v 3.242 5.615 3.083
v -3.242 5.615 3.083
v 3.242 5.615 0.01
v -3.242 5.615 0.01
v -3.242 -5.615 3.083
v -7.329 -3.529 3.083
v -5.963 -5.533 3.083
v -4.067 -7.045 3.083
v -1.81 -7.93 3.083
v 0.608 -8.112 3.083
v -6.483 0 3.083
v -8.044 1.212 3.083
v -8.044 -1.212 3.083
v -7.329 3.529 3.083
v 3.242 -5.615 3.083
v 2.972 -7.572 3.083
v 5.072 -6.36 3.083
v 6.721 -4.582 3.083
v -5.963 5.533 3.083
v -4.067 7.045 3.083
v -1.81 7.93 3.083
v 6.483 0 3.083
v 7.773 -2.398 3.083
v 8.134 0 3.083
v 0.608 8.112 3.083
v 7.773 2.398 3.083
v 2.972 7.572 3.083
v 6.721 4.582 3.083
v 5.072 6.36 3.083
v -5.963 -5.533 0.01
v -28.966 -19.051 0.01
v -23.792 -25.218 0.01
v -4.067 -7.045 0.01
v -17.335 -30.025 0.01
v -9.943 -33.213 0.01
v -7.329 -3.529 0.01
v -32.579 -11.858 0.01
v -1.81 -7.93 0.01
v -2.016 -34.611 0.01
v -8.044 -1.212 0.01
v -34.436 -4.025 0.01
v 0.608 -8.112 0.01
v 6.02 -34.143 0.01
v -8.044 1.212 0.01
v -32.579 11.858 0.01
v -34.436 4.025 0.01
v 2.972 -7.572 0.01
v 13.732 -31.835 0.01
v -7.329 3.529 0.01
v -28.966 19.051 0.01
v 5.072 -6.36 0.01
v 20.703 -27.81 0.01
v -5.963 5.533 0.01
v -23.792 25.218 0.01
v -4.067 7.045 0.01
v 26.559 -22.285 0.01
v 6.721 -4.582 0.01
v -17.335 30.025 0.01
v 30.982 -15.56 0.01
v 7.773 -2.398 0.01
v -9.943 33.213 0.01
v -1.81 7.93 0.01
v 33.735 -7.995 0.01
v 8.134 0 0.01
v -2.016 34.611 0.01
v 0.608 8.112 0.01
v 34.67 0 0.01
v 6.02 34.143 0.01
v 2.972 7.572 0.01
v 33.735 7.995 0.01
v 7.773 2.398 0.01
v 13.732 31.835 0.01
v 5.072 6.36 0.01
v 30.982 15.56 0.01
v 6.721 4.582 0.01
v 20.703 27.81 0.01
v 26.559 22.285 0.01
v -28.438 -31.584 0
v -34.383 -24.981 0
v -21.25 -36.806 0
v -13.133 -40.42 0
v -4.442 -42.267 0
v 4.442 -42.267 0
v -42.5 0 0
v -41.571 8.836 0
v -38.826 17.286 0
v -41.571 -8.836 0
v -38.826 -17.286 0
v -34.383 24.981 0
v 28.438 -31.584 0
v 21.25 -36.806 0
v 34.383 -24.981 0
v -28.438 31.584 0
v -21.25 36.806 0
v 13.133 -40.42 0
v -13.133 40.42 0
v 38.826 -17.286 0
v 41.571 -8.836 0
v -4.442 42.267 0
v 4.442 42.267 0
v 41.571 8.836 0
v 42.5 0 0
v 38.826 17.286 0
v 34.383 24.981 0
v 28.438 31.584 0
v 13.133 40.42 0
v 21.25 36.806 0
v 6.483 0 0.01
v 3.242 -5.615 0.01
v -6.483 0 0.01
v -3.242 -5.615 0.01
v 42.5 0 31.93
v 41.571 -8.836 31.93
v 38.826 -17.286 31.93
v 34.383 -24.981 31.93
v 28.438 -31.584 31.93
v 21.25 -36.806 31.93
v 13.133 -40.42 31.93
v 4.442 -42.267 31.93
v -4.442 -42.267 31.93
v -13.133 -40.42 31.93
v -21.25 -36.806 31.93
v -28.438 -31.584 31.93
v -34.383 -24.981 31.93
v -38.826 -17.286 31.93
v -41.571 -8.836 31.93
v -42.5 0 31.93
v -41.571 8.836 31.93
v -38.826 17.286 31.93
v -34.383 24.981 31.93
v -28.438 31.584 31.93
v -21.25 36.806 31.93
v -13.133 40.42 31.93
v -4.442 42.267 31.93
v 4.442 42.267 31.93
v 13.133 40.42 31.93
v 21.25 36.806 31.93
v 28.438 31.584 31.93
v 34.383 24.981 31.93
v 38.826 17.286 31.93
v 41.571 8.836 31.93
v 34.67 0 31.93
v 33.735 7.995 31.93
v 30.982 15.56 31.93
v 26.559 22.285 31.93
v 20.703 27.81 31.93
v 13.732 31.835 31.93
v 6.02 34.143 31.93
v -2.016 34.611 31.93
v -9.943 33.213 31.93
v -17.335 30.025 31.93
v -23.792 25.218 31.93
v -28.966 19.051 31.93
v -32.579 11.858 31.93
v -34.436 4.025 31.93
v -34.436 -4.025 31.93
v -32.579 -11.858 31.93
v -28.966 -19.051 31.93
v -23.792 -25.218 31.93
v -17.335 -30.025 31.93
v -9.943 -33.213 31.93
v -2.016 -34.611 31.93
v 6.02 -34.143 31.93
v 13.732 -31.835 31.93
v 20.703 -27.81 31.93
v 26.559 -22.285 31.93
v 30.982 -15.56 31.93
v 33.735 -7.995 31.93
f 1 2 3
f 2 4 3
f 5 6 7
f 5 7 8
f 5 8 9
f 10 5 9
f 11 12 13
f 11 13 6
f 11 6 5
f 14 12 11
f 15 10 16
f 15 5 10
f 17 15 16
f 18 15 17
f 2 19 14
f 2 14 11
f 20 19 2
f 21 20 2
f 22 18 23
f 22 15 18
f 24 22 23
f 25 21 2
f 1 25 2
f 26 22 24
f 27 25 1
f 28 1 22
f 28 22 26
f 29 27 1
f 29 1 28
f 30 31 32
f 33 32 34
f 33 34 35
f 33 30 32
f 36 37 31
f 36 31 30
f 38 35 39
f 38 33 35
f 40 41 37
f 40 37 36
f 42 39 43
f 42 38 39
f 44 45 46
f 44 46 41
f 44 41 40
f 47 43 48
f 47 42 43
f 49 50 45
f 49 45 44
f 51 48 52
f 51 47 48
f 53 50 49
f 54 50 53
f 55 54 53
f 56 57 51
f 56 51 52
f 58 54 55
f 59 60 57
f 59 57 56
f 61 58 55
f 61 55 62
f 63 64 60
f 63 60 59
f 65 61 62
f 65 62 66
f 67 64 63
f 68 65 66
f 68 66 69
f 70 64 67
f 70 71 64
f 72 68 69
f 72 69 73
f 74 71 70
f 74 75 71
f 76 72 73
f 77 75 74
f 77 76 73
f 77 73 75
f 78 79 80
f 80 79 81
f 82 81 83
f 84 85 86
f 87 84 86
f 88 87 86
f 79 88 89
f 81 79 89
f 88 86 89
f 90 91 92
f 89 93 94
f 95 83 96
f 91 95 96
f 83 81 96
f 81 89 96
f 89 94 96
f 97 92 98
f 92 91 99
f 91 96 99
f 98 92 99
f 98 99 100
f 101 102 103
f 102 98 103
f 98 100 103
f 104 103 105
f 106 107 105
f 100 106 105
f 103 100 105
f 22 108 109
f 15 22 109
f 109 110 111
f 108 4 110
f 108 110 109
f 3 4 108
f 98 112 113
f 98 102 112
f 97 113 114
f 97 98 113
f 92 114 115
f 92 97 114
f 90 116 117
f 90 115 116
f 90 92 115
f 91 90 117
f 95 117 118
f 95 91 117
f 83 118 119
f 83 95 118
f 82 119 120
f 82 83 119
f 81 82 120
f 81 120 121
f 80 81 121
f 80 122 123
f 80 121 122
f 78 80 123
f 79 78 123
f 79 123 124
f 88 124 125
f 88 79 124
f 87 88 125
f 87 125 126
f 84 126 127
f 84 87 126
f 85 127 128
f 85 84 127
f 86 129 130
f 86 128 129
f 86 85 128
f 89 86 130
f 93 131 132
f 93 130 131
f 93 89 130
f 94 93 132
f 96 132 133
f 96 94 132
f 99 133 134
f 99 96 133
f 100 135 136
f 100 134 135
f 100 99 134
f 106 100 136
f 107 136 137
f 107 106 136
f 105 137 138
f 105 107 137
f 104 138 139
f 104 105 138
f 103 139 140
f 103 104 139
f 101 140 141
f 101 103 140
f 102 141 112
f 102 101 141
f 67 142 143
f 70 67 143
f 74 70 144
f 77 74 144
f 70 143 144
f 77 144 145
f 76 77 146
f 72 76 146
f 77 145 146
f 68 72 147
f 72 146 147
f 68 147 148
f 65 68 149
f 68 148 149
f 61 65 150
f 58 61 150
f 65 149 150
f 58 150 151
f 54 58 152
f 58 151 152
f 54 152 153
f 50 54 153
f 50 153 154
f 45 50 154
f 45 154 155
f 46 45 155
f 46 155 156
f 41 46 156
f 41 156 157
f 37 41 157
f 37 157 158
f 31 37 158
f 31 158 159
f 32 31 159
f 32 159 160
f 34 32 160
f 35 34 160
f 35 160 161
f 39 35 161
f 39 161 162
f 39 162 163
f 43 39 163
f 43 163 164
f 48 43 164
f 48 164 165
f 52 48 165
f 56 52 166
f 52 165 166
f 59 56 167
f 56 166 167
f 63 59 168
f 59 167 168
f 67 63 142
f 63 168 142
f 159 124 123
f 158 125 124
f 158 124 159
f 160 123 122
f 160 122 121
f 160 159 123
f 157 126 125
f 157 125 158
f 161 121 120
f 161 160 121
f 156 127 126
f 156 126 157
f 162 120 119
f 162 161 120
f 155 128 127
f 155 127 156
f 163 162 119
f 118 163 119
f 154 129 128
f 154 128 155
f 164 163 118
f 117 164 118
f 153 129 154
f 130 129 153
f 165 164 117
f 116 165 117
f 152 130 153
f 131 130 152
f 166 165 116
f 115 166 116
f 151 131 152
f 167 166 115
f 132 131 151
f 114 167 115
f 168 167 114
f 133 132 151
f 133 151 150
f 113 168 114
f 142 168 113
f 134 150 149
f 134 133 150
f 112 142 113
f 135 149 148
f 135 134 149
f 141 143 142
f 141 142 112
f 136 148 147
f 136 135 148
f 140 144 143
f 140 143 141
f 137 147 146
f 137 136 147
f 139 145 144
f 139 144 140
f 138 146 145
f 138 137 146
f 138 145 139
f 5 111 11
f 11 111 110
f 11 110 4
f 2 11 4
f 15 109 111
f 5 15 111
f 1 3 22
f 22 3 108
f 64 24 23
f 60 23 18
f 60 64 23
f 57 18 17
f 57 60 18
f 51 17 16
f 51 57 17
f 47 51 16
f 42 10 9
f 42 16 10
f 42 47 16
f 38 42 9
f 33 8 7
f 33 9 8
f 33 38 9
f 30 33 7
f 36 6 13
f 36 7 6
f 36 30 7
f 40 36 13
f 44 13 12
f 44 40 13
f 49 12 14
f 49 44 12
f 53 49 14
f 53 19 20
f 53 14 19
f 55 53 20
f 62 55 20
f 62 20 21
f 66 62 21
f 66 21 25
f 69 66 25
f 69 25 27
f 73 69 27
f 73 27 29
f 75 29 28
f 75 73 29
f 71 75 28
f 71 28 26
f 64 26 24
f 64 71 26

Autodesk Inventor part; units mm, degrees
ref_plane "YZ Plane" through (0, 0, 0) normal (1, 0, 0) x (0, 1, 0)
ref_plane "XZ Plane" through (0, 0, 0) normal (0, 1, 0) x (-1, 0, 0)
ref_plane "XY Plane" through (0, 0, 0) normal (0, 0, 1) x (1, 0, 0)
sketch "Sketch1" plane through (0, 0, 0) normal (0, 0, 1) x (1, 0, 0)
  circle A0 centre (0, 0) radius 42.5
  dimension "d0" = 85
extrude "Extrusion1" add sketch "Sketch1" along normal blind 31.93
sketch "Sketch2" plane through (0, 0, 31.93) normal (0, 0, 1) x (1, 0, 0)
  circle A0 centre (0, 0) radius 34.67
  circle A1 centre (0, 0) radius 42.5 projected
  dimension "d3" = 7.83
extrude "Extrusion2" cut sketch "Sketch2" against normal blind 31.92 contours A0
sketch "Sketch5" plane through (0, 0, 0.01) normal (0, 0, 1) x (1, 0, 0)
  line L0 (3.2417, 5.6147) -> (6.4833, 0)
  line L1 (6.4833, 0) -> (3.2417, -5.6147)
  line L2 (3.2417, -5.6147) -> (-3.2417, -5.6147)
  line L3 (-3.2417, -5.6147) -> (-6.4833, 0)
  line L4 (-6.4833, 0) -> (-3.2417, 5.6147)
  line L5 (-3.2417, 5.6147) -> (3.2417, 5.6147)
  line L6 (-59.5, 0) -> (59.5, 0) projected
  line L7 (0, -59.5) -> (0, 59.5) projected
  circle A0 centre (0, 0) radius 6.4833
  circle A1 centre (0, 0) radius 8.1344
  dimension "d13" = 12.9667
  dimension "d14" = 1.651
extrude "Extrusion5" add sketch "Sketch5" along normal blind 3.0734 contours A0 L0 | A0 L7 A1 L6 | L5 L7 A0 | A0 L1 | L6 A1 L7 A0 | L5 A0 L7 | A0 L6 A1 L7 | A0 L7 L2 | L4 A0 | L7 A0 L2 | L7 A1 L6 A0 | L3 A0
properties part number "wheel"
